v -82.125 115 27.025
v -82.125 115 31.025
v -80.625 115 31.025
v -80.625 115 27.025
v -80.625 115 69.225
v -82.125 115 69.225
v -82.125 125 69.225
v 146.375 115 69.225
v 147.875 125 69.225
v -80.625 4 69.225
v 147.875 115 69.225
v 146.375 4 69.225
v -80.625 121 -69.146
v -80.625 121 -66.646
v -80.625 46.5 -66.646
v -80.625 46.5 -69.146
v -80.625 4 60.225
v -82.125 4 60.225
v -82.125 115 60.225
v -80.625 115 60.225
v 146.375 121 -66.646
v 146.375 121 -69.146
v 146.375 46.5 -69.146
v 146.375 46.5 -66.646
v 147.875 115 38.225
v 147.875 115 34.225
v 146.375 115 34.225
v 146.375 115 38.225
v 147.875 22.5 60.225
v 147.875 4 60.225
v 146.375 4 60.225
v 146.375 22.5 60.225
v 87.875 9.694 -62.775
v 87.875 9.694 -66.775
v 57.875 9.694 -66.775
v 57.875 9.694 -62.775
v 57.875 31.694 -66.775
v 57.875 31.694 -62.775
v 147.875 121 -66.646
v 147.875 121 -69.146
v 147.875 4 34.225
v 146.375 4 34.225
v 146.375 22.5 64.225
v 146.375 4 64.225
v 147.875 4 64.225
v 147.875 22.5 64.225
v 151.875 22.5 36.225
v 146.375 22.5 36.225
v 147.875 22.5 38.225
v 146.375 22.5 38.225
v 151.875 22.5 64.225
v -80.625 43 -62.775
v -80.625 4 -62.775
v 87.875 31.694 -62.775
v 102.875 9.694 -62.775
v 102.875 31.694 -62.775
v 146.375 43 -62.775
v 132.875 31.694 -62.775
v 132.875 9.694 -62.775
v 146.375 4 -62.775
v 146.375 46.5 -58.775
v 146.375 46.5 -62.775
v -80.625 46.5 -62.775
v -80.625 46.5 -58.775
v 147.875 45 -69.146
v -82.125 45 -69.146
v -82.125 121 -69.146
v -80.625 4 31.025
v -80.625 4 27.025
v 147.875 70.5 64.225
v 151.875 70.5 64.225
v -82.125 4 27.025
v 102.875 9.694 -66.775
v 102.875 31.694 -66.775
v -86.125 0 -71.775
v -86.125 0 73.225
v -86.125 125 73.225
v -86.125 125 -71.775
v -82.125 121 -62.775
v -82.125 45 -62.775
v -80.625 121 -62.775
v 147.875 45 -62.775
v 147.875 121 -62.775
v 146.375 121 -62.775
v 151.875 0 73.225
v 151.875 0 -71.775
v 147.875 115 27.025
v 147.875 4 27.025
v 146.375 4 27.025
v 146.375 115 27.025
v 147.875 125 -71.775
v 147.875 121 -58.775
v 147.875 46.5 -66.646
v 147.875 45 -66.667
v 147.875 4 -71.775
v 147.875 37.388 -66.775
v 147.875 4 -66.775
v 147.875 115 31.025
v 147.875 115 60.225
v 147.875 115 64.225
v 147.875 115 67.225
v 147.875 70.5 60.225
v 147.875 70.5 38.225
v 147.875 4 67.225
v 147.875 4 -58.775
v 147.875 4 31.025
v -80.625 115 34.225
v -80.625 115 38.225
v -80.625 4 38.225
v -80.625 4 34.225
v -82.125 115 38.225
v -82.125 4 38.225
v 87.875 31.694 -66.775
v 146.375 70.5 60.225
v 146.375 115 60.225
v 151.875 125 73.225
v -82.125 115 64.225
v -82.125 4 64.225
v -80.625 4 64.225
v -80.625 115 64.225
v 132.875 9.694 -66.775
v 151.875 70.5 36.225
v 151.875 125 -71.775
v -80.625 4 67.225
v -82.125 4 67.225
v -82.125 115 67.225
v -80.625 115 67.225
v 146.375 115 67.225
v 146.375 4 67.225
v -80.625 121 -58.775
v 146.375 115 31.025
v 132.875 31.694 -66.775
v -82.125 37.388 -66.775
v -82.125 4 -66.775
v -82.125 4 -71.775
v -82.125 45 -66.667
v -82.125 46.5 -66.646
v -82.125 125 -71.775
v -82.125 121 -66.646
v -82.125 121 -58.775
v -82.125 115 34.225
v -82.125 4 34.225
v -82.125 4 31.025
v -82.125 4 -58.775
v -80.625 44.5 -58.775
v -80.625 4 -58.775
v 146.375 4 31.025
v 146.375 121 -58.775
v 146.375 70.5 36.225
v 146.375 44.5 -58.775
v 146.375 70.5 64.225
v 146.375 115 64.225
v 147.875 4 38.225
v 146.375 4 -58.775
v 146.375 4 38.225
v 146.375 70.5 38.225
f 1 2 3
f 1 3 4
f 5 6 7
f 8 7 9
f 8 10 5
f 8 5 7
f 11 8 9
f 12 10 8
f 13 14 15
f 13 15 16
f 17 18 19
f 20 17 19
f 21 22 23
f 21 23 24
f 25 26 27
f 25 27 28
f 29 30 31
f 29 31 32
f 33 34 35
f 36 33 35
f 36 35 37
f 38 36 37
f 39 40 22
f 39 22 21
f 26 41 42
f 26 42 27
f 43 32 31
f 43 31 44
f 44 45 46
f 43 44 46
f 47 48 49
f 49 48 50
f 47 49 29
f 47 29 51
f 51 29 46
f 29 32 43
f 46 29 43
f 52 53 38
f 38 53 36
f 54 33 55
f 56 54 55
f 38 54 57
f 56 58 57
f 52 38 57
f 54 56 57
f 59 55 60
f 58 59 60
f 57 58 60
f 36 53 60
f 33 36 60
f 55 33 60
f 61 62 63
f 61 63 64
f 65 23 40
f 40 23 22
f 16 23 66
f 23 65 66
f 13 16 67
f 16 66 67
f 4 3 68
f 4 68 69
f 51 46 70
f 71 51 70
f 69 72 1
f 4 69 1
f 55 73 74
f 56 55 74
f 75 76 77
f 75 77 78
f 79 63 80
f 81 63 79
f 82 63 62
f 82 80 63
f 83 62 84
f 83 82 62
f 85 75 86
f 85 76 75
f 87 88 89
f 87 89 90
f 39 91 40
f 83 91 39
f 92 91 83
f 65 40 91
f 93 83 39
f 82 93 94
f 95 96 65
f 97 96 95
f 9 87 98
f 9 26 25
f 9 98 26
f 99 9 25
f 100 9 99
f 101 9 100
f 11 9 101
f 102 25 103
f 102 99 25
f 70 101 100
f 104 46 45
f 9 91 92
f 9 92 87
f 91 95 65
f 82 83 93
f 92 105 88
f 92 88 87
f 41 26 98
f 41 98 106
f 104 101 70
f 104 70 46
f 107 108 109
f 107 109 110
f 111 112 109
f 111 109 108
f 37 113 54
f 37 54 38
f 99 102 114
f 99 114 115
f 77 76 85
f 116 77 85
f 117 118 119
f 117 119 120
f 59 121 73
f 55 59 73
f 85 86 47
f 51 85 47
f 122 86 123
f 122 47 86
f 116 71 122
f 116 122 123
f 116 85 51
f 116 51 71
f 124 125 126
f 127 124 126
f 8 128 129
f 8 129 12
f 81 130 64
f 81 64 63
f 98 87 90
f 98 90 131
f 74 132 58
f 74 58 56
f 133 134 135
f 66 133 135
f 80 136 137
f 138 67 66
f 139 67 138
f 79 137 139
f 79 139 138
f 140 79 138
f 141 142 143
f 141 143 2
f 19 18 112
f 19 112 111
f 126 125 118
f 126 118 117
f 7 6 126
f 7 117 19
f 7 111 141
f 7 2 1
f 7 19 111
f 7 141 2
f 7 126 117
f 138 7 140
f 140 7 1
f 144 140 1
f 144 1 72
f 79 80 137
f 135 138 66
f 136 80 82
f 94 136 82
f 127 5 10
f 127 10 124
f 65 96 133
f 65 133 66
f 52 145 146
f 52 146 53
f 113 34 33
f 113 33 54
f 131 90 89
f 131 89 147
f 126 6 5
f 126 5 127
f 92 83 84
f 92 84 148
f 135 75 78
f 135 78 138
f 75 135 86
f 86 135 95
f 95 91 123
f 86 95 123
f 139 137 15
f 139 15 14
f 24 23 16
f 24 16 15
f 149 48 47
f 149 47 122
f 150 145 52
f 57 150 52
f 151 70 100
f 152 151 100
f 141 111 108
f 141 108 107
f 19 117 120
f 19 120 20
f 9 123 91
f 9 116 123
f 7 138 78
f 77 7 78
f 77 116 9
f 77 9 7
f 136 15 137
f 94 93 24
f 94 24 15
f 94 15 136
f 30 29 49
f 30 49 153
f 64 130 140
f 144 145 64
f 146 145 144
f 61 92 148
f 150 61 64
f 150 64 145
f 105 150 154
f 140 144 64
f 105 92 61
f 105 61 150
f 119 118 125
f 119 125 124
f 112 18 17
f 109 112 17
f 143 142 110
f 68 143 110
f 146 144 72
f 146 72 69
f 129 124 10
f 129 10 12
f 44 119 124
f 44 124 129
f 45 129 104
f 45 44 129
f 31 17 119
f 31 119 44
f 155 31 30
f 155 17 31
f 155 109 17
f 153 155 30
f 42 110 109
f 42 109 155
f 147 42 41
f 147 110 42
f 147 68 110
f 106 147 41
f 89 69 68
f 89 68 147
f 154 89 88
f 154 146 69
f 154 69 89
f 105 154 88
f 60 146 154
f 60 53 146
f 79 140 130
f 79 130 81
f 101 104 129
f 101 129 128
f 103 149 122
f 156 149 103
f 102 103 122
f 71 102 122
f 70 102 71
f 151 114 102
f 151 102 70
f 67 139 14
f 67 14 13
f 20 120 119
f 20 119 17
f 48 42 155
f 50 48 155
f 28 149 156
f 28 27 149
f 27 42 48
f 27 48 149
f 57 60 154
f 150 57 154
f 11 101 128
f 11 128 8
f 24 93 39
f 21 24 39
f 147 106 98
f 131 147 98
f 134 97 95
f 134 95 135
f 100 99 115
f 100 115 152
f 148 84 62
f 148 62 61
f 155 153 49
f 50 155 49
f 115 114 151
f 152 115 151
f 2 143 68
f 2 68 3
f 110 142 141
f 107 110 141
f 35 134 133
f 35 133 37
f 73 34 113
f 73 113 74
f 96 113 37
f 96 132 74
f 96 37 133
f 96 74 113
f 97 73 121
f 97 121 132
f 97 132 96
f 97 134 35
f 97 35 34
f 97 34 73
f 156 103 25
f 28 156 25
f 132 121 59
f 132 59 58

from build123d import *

# Parameters (mm, degrees)
SKETCH_1_W          = 238
SKETCH_1_H          = 140
EXTRUDE_3_DEPTH     = 125
SHELL_1_T           = -4
SKETCH_2_W          = 230
SKETCH_2_H          = 80
CUT_EXTRUDE_1_DEPTH = 120
SKETCH_5_W          = 4
SKETCH_5_H          = 117
EXTRUDE_6_DEPTH     = 1.5
SKETCH_6_W          = 4
SKETCH_6_H          = 117
EXTRUDE_7_DEPTH     = 1.5
EXTRUDE_8_DEPTH     = 5
EXTRUDE_9_DEPTH     = 230
EXTRUDE_10_DEPTH    = 227
SKETCH_10_W         = 2.5
SKETCH_10_H         = 74.5
EXTRUDE_11_DEPTH    = 1.5
SKETCH_11_W         = 2.5
SKETCH_11_H         = 74.5
EXTRUDE_12_DEPTH    = 1.5
SKETCH_12_W         = 4
SKETCH_12_H         = 111
EXTRUDE_14_DEPTH    = 1.5
SKETCH_13_W         = 2
SKETCH_13_H         = 111
SKETCH_13_W_2       = 4
EXTRUDE_17_DEPTH    = 1.5
SKETCH_14_W         = 28
SKETCH_14_H         = 48
CUT_EXTRUDE_3_DEPTH = 18
SKETCH_15_W         = 30
SKETCH_15_H         = 22
CUT_EXTRUDE_4_DEPTH = 18
SKETCH_16_W         = 2
SKETCH_16_H         = 111
EXTRUDE_18_DEPTH    = 1.5
SKETCH_17_W         = 4
SKETCH_17_H         = 111
EXTRUDE_19_DEPTH    = 1.5
SKETCH_19_W         = 4
SKETCH_19_H         = 111
EXTRUDE_20_DEPTH    = 1.5
SKETCH_20_W         = 4
SKETCH_20_H         = 111
EXTRUDE_21_DEPTH    = 1.5


with BuildPart() as part:
    # 草图1 → 凸台-拉伸3 (new body)
    with BuildSketch(Plane(origin=(0, 0, 0), x_dir=(1, 0, 0), z_dir=(0, 1, 0))):
        with Locations((32.875338753, -3.224932249)):
            Rectangle(SKETCH_1_W, SKETCH_1_H)
    extrude(amount=EXTRUDE_3_DEPTH)

    # 抽壳1
    shell_1_openings = [part.faces().sort_by_distance(p)[0] for p in [
        (32.875338753, 125, 3.224932249),
    ]]
    offset(amount=SHELL_1_T, openings=shell_1_openings, kind=Kind.INTERSECTION)

    # 草图2 → 切除-拉伸1 (cut)
    with BuildSketch(Plane.XY.offset(-62.775067751)):
        with Locations((32.875338753, 85)):
            Rectangle(SKETCH_2_W, SKETCH_2_H)
    extrude(amount=-CUT_EXTRUDE_1_DEPTH, mode=Mode.SUBTRACT)

    # 草图5 → 凸台-拉伸6 (add)
    with BuildSketch(Plane.ZY.offset(-147.875338753)):
        with Locations((-60.775067751, 62.5)):
            Rectangle(SKETCH_5_W, SKETCH_5_H)
    extrude(amount=EXTRUDE_6_DEPTH)

    # 草图6 → 凸台-拉伸7 (add)
    with BuildSketch(Plane(origin=(-82.124661247, 0, 0), x_dir=(0, 0, -1), z_dir=(1, 0, 0))):
        with Locations((60.775067751, 62.5)):
            Rectangle(SKETCH_6_W, SKETCH_6_H)
    extrude(amount=EXTRUDE_7_DEPTH)

    # 草图7 → 凸台-拉伸8 (add)
    with BuildSketch(Plane(origin=(0, 0, -66.775067751), x_dir=(-1, 0, 0), z_dir=(0, 0, -1))):
        Polygon((-151.875338753, 125), (-147.875338753, 125), (-147.875338753, 4), (82.124661247, 4), (82.124661247, 125), (86.124661247, 125), (86.124661247, 0), (-151.875338753, 0), align=None)
    extrude(amount=EXTRUDE_8_DEPTH)

    # 草图8 → 凸台-拉伸9 (add)
    with BuildSketch(Plane.ZY.offset(-147.875338753)):
        Polygon((-66.645720039, 46.5), (-66.775067751, 37.387932584), (-69.145720039, 45), (-69.145720039, 46.5), align=None)
    extrude(amount=EXTRUDE_9_DEPTH)

    # 草图9 → 凸台-拉伸10 (add)
    with BuildSketch(Plane.ZY.offset(-146.375338753)):
        Polygon((-62.775067751, 46.5), (-58.775067751, 46.5), (-58.775067751, 44.5), (-62.775067751, 43), align=None)
    extrude(amount=EXTRUDE_10_DEPTH)

    # 草图10 → 凸台-拉伸11 (add)
    with BuildSketch(Plane.ZY.offset(-147.875338753)):
        with Locations((-67.895720039, 83.75)):
            Rectangle(SKETCH_10_W, SKETCH_10_H)
    extrude(amount=EXTRUDE_11_DEPTH)

    # 草图11 → 凸台-拉伸12 (add)
    with BuildSketch(Plane(origin=(-82.124661247, 0, 0), x_dir=(0, 0, -1), z_dir=(1, 0, 0))):
        with Locations((67.895720039, 83.75)):
            Rectangle(SKETCH_11_W, SKETCH_11_H)
    extrude(amount=EXTRUDE_12_DEPTH)

    # 草图12 → 凸台-拉伸14 (add)
    with BuildSketch(Plane.ZY.offset(-147.875338753)):
        with Locations((36.224932249, 59.5)):
            Rectangle(SKETCH_12_W, SKETCH_12_H)
        with Locations((29.024932249, 59.5)):
            Rectangle(SKETCH_12_W, SKETCH_12_H)
    extrude(amount=EXTRUDE_14_DEPTH)

    # 草图13 → 凸台-拉伸17 (add)
    with BuildSketch(Plane.ZY.offset(-147.875338753)):
        with Locations((68.224932249, 59.5)):
            Rectangle(SKETCH_13_W, SKETCH_13_H)
        with Locations((62.224932249, 59.5)):
            Rectangle(SKETCH_13_W_2, SKETCH_13_H)
    extrude(amount=EXTRUDE_17_DEPTH)

    # 草图14 → 切除-拉伸3 (cut)
    with BuildSketch(Plane.ZY.offset(-146.375338753)):
        with Locations((50.224932249, 46.5)):
            Rectangle(SKETCH_14_W, SKETCH_14_H)
    extrude(amount=-CUT_EXTRUDE_3_DEPTH, mode=Mode.SUBTRACT)

    # 草图15 → 切除-拉伸4 (cut)
    with BuildSketch(Plane(origin=(0, 0, -66.775067751), x_dir=(-1, 0, 0), z_dir=(0, 0, -1))):
        with Locations((-117.875338753, 20.693966292)):
            Rectangle(SKETCH_15_W, SKETCH_15_H)
        with Locations((-72.875338753, 20.693966292)):
            Rectangle(SKETCH_15_W, SKETCH_15_H)
    extrude(amount=-CUT_EXTRUDE_4_DEPTH, mode=Mode.SUBTRACT)

    # 草图16 → 凸台-拉伸18 (add)
    with BuildSketch(Plane(origin=(-82.124661247, 0, 0), x_dir=(0, 0, -1), z_dir=(1, 0, 0))):
        with Locations((-68.224932249, 59.5)):
            Rectangle(SKETCH_16_W, SKETCH_16_H)
    extrude(amount=EXTRUDE_18_DEPTH)

    # 草图17 → 凸台-拉伸19 (add)
    with BuildSketch(Plane(origin=(-82.124661247, 0, 0), x_dir=(0, 0, -1), z_dir=(1, 0, 0))):
        with Locations((-62.224932249, 59.5)):
            Rectangle(SKETCH_17_W, SKETCH_17_H)
    extrude(amount=EXTRUDE_19_DEPTH)

    # 草图19 → 凸台-拉伸20 (add)
    with BuildSketch(Plane(origin=(-82.124661247, 0, 0), x_dir=(0, 0, -1), z_dir=(1, 0, 0))):
        with Locations((-36.224932249, 59.5)):
            Rectangle(SKETCH_19_W, SKETCH_19_H)
    extrude(amount=EXTRUDE_20_DEPTH)

    # 草图20 → 凸台-拉伸21 (add)
    with BuildSketch(Plane(origin=(-82.124661247, 0, 0), x_dir=(0, 0, -1), z_dir=(1, 0, 0))):
        with Locations((-29.024932249, 59.5)):
            Rectangle(SKETCH_20_W, SKETCH_20_H)
    extrude(amount=EXTRUDE_21_DEPTH)


solid = part.part
